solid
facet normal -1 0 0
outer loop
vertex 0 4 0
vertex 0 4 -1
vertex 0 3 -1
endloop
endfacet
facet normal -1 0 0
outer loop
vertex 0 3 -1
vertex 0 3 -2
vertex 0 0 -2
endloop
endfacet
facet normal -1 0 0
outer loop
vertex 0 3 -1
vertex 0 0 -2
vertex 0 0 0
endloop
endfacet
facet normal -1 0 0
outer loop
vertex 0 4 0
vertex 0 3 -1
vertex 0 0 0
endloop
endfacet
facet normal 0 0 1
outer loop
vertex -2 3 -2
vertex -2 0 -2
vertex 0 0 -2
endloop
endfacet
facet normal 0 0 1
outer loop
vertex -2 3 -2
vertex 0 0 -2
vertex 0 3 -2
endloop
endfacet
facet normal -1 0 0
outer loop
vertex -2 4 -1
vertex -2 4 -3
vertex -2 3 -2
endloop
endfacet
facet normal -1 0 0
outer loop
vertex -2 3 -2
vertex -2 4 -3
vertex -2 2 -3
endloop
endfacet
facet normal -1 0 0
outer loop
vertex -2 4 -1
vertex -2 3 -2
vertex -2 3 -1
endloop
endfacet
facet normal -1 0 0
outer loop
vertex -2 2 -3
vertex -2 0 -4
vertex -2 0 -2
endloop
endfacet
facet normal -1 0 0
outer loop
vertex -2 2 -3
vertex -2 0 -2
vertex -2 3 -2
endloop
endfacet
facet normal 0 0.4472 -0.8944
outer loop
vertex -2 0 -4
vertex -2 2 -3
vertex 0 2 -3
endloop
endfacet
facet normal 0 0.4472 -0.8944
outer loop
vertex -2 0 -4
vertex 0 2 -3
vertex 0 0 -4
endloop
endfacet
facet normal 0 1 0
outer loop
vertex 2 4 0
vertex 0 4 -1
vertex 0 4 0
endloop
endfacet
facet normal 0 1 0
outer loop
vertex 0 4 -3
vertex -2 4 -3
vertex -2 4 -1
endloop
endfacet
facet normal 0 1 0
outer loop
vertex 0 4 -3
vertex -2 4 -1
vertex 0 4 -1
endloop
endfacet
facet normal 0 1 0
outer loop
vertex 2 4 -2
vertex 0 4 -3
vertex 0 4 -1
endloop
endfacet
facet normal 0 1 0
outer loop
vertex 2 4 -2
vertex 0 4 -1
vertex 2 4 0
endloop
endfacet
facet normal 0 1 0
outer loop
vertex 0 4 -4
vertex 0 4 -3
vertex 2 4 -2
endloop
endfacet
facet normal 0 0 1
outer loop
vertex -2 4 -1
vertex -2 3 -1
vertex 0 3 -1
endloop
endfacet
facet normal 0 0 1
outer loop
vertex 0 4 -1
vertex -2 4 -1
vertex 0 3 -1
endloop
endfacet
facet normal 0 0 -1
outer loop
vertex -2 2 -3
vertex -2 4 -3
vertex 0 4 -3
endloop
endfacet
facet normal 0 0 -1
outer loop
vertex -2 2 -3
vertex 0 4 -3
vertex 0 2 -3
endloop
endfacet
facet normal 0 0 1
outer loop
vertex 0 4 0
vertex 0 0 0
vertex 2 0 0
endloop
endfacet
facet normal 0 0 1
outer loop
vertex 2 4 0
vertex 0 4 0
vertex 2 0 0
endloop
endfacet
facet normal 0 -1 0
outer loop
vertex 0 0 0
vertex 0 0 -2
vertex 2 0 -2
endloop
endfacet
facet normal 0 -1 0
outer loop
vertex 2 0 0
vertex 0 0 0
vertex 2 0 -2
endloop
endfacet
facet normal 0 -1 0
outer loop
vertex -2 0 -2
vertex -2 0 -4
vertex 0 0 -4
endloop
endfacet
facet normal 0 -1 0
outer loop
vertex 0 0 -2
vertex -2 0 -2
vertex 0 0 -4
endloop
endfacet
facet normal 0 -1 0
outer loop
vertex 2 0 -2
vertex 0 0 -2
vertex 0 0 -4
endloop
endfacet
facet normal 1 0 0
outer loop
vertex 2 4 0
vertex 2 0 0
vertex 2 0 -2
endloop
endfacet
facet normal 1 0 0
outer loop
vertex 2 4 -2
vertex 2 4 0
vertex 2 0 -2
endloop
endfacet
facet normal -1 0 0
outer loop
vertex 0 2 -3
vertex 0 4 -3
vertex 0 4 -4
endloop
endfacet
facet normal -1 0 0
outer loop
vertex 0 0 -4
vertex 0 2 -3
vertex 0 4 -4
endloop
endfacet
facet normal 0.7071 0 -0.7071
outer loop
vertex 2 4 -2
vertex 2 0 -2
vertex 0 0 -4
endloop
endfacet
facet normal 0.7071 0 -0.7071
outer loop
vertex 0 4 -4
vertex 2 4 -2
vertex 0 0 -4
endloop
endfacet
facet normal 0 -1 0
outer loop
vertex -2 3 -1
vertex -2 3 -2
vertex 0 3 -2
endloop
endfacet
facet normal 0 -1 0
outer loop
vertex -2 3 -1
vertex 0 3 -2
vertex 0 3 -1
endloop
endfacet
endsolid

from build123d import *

# Parameters (mm, degrees)
BOSS_EXTRUDE1_DEPTH = 4
SKETCH2_W           = 1
SKETCH2_H           = 3
CUT_EXTRUDE1_DEPTH  = 2


with BuildPart() as part:
    # Sketch1 → Boss-Extrude1 (new body)
    with BuildSketch(Plane(origin=(0, 0, 0), x_dir=(1, 0, 0), z_dir=(0, 1, 0))):
        Polygon((0, 0), (2, 0), (2, 2), (0, 4), (-2, 4), (-2, 1), (0, 1), align=None)
    extrude(amount=BOSS_EXTRUDE1_DEPTH)

    # Sketch2 → Cut-Extrude1 (cut)
    with BuildSketch(Plane.ZY.offset(2)):
        with Locations((-1.5, 1.5)):
            Rectangle(SKETCH2_W, SKETCH2_H)
        Polygon((-3, 4), (-3, 2), (-4, 0), (-4, 2), (-4, 4), align=None)
    extrude(amount=-CUT_EXTRUDE1_DEPTH, mode=Mode.SUBTRACT)


solid = part.part
